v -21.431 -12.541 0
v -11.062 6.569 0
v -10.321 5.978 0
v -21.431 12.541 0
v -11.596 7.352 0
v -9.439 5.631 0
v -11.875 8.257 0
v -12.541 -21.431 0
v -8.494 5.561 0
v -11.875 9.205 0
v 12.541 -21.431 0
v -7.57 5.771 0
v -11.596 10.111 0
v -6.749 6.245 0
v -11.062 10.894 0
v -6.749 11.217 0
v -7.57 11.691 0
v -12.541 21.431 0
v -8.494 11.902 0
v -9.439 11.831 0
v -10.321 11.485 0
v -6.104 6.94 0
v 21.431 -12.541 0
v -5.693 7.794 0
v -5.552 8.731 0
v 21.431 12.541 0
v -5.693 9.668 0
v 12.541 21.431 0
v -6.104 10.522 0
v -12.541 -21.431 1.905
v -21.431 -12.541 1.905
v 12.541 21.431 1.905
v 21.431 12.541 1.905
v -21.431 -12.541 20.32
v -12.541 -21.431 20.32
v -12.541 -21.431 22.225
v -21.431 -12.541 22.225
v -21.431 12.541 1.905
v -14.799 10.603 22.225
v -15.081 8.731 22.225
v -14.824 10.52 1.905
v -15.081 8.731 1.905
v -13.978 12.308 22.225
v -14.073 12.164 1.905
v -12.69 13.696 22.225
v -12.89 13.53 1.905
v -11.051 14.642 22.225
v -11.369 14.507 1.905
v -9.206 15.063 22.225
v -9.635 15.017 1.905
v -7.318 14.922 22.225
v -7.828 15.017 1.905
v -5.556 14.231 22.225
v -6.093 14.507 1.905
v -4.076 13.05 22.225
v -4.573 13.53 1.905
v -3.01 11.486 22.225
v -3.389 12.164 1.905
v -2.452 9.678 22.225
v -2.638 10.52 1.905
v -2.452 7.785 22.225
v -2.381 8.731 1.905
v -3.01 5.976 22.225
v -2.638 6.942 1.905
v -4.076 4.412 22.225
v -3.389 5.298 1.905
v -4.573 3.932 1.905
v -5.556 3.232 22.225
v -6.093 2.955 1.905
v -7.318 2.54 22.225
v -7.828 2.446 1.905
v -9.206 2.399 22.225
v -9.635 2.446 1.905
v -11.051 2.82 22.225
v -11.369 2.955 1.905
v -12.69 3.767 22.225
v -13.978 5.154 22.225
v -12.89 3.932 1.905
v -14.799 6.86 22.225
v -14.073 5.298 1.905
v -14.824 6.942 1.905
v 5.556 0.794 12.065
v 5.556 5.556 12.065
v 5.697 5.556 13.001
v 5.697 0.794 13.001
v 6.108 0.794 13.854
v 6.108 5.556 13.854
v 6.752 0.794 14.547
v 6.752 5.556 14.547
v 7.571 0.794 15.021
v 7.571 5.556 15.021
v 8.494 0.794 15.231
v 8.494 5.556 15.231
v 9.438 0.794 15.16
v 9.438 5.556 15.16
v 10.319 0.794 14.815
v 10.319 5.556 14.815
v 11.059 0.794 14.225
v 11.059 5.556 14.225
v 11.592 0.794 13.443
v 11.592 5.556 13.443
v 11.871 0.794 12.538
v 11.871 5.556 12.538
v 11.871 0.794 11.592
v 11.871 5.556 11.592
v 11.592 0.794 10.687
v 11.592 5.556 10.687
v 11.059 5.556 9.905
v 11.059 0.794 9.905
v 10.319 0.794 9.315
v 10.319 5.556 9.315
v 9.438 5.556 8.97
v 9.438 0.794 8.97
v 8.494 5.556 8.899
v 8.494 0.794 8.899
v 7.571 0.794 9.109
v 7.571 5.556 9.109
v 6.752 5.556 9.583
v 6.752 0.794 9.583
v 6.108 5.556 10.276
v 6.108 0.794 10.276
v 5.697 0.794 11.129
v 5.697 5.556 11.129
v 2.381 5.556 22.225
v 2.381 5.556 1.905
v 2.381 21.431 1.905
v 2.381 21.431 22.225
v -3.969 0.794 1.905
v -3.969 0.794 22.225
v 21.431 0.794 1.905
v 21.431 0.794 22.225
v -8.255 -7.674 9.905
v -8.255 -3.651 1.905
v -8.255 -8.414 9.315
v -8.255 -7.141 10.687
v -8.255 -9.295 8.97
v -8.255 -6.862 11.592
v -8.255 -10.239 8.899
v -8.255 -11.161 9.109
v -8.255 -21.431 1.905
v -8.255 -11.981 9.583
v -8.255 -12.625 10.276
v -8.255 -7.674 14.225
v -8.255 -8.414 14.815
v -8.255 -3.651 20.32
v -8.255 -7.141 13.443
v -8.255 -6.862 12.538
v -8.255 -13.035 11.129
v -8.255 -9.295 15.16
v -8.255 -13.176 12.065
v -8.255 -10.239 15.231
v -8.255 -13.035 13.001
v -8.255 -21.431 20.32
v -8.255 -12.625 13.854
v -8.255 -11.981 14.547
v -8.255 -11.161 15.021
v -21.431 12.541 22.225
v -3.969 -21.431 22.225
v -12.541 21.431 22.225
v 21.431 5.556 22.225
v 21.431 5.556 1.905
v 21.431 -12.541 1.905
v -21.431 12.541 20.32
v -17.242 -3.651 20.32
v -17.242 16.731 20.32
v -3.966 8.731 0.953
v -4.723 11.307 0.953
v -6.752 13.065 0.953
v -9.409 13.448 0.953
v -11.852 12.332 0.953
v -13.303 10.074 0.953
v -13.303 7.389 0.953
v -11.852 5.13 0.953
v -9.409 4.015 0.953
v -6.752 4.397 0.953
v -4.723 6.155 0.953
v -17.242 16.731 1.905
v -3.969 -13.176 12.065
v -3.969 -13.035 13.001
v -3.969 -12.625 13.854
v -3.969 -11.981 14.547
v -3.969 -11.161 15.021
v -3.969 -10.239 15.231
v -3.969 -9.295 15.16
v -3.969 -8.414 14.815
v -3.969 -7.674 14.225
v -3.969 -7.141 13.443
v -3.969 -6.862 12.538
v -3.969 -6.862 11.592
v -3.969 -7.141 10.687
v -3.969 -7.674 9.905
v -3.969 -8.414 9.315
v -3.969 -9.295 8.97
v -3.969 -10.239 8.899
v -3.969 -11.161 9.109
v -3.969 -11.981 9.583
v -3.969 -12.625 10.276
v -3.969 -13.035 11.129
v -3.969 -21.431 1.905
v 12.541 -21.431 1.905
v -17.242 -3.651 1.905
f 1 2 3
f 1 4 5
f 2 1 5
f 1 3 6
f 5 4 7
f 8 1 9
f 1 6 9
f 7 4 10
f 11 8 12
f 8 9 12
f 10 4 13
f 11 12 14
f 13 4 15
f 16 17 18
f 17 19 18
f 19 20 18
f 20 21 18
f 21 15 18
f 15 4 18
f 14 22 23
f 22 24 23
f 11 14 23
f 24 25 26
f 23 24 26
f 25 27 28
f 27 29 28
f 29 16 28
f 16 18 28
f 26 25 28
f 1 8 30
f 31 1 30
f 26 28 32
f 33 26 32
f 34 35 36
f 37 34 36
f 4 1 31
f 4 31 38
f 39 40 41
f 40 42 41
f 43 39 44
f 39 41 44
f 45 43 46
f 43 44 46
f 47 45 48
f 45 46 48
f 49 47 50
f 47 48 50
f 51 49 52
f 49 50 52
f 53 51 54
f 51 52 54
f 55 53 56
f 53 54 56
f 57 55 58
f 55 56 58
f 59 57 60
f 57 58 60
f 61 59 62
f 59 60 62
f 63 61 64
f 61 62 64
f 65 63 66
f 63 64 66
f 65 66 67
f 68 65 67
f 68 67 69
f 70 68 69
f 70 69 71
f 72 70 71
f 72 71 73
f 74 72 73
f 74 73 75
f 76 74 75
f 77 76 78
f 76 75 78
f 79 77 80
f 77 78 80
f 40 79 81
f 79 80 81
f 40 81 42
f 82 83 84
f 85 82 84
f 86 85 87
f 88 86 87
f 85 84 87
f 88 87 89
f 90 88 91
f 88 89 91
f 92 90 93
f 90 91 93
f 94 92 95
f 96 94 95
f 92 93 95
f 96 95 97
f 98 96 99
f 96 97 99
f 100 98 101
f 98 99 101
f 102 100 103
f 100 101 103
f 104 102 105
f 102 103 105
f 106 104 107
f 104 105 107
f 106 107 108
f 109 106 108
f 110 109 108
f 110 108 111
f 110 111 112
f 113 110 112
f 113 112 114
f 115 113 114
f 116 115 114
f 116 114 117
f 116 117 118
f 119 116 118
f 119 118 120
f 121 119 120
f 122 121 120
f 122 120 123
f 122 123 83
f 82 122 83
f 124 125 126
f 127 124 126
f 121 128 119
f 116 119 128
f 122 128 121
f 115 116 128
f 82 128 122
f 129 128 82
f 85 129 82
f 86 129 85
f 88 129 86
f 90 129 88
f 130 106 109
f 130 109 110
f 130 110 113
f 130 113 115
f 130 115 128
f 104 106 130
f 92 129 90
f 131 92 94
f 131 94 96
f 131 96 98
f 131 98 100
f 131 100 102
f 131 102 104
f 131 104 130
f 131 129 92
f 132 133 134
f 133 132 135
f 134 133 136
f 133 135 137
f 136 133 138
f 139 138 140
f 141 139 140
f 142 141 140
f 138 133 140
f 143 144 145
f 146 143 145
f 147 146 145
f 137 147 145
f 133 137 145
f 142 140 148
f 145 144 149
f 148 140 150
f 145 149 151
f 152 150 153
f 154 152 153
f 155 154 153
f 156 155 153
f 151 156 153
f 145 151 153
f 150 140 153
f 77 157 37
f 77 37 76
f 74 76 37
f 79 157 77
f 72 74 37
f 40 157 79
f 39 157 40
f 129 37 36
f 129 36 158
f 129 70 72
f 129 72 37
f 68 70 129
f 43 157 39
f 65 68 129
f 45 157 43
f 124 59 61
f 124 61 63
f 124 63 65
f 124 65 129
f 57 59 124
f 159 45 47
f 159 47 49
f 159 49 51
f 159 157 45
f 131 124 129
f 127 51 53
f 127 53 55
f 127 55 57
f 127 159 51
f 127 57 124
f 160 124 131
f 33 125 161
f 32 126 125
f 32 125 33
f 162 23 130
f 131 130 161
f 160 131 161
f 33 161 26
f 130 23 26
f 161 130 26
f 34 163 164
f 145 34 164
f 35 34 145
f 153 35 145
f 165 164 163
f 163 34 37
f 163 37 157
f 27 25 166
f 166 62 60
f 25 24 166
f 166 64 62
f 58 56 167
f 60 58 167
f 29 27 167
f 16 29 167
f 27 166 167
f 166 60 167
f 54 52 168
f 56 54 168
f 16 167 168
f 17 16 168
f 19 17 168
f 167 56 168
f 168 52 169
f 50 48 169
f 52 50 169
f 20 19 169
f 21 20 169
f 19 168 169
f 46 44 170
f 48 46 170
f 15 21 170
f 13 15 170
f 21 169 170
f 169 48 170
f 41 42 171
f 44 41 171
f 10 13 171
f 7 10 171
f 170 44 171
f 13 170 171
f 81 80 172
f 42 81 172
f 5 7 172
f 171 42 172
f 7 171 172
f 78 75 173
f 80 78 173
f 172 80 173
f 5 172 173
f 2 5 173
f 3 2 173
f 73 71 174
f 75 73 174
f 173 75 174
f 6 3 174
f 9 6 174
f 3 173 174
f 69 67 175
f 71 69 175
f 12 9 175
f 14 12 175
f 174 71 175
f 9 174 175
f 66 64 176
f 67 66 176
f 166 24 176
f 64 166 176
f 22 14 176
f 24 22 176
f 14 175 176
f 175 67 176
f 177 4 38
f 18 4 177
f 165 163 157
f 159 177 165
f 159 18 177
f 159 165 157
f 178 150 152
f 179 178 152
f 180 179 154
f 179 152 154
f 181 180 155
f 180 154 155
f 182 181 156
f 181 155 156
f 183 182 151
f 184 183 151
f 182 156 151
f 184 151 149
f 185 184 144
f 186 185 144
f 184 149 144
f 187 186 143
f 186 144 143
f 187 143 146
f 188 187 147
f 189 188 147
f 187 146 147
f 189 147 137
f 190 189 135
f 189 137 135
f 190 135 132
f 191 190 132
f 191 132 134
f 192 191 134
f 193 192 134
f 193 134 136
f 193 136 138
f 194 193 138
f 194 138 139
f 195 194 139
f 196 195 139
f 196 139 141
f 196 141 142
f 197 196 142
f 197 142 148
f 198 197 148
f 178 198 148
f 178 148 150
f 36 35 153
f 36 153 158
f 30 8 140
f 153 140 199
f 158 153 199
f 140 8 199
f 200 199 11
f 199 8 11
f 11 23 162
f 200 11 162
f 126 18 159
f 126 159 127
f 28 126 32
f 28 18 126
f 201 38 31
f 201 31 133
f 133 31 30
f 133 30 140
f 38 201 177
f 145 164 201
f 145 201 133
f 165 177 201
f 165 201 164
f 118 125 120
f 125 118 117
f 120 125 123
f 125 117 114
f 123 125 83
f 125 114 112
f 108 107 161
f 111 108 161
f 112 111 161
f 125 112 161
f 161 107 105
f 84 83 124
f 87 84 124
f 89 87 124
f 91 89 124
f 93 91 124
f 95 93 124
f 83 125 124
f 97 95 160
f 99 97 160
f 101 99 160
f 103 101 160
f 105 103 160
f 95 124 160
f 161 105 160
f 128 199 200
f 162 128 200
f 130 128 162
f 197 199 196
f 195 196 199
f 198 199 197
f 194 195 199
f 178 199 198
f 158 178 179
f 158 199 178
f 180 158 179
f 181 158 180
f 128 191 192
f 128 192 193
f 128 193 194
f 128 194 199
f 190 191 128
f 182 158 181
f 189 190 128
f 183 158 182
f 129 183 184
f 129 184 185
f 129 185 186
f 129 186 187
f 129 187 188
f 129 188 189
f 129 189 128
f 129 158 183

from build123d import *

# Parameters (mm, degrees)
F0_W      = 42.8625
F0_H      = 42.8625
F1_DEPTH  = 22.225
F2_SIZE   = 8.89
F3_W      = 25.4
F3_H      = 22.225
F4_DEPTH  = 20.32
F5_W      = 19.05
F5_H      = 15.875
F6_DEPTH  = 20.32
F8_D      = 12.7
F8_DEPTH  = 20.32
F8_TIP    = 3.8154649308
F9_W      = 14.1852621388
F9_H      = 18.415
F10_DEPTH = 17.78
F11_W     = 6.263975054
F11_H     = 18.415
F12_DEPTH = 25.0835
F14_D     = 6.35
F16_D     = 6.35


with BuildPart() as f1:
    # F0 (on Top) → F1 (new body)
    with BuildSketch(Plane.XY):
        Rectangle(F0_W, F0_H)
    extrude(amount=F1_DEPTH)

    # F2
    f2_edges = [f1.edges().sort_by_distance(p)[0] for p in [
        (-21.43125, -21.43125, 11.1125),
        (21.43125, -21.43125, 11.1125),
        (21.43125, 21.43125, 11.1125),
        (-21.43125, 21.43125, 11.1125),
    ]]
    chamfer(f2_edges, length=F2_SIZE)

    # F3 (on face) → F4 (cut)
    with BuildSketch(Plane.XY.offset(22.225)):
        with Locations((8.73125, -10.31875)):
            Rectangle(F3_W, F3_H)
    extrude(amount=-F4_DEPTH, mode=Mode.SUBTRACT)

    # F5 (on face) → F6 (cut)
    with BuildSketch(Plane.XY.offset(22.225)):
        with Locations((11.90625, 13.49375)):
            Rectangle(F5_W, F5_H)
    extrude(amount=-F6_DEPTH, mode=Mode.SUBTRACT)

    # F8
    with Locations(Plane.XY.offset(22.225)):
        with Locations((-8.73125, 8.73125)):
            Hole(F8_D / 2, depth=F8_DEPTH)
            with Locations((0, 0, -(F8_DEPTH + F8_TIP / 2))):  # 118° drill point
                Cone(0, F8_D / 2, F8_TIP, mode=Mode.SUBTRACT)

    # F9 (on face) → F10 (cut)
    with BuildSketch(Plane.XZ.offset(21.43125)):
        with Locations((-15.3476310694, 11.1125)):
            Rectangle(F9_W, F9_H)
    extrude(amount=-F10_DEPTH, mode=Mode.SUBTRACT)

    # F11 (on face) → F12 (cut, through all)
    with BuildSketch(Plane.XZ.offset(3.65125)):
        with Locations((-20.3739013523, 11.1125)):
            Rectangle(F11_W, F11_H)
    extrude(amount=-F12_DEPTH, mode=Mode.SUBTRACT)

    # F14 (through all)
    with Locations(Plane.YZ.offset(-3.96875)):
        with Locations((-10.00125, 12.065)):
            Hole(F14_D / 2)

    # F16 (through all)
    with Locations(Plane.XZ.offset(-0.79375)):
        with Locations((8.73125, 12.065)):
            Hole(F16_D / 2)


solid = f1.part
